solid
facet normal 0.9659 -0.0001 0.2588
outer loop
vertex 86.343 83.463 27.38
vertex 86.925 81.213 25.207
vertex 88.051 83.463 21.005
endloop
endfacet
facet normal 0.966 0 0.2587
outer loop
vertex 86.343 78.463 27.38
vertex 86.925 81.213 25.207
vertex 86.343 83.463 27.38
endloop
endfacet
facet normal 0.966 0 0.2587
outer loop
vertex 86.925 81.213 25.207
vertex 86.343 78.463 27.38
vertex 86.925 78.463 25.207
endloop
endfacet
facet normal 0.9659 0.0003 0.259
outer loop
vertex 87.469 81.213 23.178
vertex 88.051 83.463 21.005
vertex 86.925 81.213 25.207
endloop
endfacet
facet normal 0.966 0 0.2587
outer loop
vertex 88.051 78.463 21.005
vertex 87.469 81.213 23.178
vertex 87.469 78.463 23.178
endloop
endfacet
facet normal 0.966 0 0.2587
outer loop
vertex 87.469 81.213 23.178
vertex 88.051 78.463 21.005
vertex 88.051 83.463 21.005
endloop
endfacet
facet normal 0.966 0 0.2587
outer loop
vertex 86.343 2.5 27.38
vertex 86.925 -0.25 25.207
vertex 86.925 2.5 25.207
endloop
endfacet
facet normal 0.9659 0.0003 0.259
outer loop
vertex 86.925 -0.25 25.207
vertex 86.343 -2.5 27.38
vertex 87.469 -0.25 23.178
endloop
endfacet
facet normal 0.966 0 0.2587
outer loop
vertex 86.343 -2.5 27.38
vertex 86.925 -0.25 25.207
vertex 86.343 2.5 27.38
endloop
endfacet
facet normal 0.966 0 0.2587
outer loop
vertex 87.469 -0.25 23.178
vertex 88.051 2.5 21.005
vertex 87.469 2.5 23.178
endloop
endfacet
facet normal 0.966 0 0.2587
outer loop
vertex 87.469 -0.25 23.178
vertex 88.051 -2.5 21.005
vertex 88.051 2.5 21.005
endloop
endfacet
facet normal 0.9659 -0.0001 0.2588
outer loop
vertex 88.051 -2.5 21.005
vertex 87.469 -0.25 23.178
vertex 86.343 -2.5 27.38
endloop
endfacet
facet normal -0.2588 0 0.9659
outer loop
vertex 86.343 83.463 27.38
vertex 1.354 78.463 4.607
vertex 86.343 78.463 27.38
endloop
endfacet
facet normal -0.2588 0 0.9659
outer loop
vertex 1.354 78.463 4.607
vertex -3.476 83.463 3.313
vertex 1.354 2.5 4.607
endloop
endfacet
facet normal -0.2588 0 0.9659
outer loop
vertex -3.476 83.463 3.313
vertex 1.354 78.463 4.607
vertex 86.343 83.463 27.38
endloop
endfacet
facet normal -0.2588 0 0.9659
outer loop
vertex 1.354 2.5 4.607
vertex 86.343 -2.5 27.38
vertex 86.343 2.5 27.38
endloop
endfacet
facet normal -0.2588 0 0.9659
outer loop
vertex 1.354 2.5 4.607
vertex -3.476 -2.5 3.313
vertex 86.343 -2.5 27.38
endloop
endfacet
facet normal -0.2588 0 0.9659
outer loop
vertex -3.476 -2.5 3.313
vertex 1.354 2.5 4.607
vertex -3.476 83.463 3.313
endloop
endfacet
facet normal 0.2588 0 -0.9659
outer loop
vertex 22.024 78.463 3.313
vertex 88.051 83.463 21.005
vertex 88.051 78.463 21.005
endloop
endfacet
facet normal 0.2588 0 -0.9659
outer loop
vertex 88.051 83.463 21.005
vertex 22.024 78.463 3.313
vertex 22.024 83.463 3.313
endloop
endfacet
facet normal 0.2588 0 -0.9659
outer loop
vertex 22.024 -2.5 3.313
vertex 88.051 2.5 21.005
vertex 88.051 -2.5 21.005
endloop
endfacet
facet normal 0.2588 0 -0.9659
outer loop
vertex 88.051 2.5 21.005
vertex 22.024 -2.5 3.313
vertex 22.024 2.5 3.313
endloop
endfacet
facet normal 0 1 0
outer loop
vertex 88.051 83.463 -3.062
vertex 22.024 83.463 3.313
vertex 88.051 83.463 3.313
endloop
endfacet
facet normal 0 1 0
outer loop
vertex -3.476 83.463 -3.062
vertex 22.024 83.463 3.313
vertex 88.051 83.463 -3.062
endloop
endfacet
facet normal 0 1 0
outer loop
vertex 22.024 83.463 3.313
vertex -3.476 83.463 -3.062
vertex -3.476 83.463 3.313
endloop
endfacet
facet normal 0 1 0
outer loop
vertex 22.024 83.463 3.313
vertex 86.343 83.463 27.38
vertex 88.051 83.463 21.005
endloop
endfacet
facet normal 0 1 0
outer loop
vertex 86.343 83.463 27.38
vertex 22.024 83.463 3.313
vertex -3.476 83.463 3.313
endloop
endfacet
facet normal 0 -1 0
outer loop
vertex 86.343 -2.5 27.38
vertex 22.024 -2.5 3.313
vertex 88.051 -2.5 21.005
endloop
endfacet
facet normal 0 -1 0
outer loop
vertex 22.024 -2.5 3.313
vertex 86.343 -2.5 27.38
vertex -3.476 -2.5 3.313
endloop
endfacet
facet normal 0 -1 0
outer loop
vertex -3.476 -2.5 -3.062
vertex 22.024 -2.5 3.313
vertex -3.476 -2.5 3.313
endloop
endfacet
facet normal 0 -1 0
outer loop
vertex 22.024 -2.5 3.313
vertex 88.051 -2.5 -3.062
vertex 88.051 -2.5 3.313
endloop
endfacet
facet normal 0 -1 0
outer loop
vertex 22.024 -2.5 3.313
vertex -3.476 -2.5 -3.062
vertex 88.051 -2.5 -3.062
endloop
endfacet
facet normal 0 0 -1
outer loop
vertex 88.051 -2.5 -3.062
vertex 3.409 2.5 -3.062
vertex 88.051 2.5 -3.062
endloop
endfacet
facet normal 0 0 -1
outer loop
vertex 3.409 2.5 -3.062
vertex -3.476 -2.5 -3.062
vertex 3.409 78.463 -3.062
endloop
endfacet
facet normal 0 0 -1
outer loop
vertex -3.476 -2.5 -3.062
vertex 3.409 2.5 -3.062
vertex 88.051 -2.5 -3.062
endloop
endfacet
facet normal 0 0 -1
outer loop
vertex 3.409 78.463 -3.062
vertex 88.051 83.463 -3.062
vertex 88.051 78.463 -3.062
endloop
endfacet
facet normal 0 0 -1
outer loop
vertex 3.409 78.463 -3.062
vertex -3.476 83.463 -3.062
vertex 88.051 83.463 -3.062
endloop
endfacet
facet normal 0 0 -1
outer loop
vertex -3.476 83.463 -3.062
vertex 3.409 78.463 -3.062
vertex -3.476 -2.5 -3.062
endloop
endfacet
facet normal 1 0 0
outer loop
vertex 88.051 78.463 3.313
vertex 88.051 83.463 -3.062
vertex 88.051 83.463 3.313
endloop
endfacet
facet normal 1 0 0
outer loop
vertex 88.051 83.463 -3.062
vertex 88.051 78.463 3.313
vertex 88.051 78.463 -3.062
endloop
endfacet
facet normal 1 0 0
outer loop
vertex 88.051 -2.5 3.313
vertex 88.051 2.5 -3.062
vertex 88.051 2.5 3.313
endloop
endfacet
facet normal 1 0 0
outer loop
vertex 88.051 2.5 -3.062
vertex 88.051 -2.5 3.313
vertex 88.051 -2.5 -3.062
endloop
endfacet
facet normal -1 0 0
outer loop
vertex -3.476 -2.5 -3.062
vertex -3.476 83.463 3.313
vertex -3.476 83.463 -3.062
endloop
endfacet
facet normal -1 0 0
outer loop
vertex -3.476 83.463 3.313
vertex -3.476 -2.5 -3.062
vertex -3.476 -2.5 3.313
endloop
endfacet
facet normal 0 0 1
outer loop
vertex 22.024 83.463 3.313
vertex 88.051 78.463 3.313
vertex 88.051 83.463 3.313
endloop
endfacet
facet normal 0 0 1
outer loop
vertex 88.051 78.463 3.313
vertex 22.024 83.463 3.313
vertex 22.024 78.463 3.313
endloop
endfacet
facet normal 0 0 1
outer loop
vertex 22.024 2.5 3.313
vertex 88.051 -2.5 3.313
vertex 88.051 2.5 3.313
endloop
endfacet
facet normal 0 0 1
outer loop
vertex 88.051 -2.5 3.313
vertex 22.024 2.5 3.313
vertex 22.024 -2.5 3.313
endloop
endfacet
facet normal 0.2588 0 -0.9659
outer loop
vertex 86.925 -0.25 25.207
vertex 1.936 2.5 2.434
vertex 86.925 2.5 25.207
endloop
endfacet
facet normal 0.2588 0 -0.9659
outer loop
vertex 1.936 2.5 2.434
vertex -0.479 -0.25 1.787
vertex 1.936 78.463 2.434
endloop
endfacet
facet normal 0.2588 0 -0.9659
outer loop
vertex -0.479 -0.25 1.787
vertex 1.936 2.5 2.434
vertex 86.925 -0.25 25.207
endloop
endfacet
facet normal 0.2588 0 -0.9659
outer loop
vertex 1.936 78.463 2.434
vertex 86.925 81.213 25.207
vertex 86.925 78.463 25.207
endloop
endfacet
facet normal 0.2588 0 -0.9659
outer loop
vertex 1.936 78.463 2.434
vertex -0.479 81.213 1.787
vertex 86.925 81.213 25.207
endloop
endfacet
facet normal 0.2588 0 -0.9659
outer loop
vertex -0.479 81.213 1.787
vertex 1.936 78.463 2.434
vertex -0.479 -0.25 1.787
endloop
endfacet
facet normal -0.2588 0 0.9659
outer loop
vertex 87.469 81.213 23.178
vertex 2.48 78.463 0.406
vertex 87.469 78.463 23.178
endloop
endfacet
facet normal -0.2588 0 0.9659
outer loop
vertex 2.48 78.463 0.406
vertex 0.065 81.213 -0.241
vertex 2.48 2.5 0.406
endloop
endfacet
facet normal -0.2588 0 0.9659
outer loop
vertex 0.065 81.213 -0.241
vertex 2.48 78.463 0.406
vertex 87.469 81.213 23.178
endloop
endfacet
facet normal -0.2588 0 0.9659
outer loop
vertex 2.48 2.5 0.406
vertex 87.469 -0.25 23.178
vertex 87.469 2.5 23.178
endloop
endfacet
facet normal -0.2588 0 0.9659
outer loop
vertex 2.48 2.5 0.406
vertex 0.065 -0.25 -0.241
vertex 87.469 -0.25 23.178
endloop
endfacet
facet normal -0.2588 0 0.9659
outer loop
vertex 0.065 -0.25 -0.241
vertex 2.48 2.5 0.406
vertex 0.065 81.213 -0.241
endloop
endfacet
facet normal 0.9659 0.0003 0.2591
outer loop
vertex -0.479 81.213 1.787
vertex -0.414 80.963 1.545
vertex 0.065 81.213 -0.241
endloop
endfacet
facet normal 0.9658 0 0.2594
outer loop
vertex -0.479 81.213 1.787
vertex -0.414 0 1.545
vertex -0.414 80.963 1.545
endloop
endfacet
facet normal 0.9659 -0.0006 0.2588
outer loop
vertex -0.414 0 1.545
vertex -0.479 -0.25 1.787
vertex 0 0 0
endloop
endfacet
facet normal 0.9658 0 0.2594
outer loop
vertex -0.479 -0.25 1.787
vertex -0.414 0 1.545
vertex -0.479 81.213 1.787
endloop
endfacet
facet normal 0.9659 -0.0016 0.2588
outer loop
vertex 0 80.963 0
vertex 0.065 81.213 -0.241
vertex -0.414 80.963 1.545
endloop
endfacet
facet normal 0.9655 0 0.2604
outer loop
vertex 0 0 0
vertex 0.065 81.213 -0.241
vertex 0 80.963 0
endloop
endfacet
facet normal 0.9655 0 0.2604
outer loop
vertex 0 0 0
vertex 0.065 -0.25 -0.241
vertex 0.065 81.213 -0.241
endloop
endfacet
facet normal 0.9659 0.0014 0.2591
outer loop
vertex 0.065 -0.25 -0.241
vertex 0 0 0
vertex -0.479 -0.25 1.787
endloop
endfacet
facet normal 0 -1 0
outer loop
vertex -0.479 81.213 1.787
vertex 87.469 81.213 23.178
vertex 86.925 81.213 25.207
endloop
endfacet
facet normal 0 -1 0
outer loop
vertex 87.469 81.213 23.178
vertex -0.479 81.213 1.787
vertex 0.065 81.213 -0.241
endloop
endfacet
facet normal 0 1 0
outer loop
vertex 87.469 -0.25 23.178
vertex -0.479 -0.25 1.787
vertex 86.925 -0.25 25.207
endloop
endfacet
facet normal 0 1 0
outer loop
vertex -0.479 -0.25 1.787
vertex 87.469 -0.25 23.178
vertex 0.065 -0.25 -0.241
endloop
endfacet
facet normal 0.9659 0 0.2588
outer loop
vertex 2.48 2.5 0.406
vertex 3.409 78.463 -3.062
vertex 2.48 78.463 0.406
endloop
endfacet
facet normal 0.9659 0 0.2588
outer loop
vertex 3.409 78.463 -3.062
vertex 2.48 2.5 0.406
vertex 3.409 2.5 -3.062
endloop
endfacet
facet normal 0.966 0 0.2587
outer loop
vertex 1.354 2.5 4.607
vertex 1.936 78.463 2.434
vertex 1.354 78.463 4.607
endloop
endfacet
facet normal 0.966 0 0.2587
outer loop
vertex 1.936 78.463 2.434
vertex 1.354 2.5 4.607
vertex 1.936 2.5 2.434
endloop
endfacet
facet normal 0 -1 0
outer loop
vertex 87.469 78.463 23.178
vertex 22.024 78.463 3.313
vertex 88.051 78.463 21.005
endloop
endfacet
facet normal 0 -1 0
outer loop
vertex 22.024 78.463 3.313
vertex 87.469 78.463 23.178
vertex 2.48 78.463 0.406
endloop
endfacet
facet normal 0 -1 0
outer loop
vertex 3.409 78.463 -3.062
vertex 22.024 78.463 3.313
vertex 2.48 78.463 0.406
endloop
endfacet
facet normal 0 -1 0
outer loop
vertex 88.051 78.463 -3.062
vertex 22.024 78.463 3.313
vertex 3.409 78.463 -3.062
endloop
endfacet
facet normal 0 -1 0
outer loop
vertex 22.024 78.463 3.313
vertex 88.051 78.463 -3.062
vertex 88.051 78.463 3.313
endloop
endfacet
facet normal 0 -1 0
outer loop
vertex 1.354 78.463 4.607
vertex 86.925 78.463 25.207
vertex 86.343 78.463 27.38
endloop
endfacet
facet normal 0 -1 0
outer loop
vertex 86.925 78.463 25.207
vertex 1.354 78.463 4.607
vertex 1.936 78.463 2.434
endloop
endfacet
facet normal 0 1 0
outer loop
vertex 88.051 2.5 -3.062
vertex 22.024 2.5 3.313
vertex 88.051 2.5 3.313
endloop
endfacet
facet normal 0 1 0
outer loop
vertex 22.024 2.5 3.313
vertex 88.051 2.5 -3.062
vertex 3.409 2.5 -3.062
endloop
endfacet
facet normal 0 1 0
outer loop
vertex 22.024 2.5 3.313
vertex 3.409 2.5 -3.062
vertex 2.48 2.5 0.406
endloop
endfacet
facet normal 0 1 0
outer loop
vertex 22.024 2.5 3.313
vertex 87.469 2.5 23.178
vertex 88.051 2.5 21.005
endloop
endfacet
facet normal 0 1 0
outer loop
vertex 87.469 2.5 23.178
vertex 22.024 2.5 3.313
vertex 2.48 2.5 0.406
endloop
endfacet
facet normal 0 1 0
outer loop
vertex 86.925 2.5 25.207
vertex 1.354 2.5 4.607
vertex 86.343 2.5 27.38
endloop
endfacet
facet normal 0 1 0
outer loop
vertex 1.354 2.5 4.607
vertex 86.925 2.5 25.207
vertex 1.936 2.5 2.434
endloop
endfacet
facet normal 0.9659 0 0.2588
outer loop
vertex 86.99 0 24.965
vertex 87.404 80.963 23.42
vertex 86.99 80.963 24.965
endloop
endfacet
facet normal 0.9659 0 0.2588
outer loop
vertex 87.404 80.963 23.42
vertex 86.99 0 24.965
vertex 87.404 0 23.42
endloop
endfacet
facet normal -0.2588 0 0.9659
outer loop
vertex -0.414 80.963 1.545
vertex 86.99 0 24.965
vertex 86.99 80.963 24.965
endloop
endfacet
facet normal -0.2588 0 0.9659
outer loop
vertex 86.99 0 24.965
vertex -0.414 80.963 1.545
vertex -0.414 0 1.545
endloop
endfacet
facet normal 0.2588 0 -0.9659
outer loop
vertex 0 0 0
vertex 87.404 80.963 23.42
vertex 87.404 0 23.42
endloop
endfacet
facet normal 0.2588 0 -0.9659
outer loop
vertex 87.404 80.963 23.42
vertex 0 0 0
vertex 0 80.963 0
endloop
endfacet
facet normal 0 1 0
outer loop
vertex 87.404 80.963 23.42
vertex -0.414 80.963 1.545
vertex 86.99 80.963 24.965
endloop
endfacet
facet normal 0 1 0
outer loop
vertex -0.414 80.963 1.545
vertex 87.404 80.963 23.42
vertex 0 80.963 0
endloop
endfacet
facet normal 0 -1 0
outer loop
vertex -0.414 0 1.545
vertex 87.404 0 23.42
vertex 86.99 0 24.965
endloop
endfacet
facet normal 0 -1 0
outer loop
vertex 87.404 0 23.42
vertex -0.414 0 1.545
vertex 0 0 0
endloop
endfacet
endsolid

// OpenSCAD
pcb_size = [90.4875,80.9625,1.6];
tolerance =0.5;
case_thickness=5;
angle = 15;


module pcb(){
    
    cube(pcb_size);
}

module case(){
    difference() {
        union() {
            cube(
                pcb_size +
                [
                    case_thickness/2,
                    case_thickness,
                    case_thickness
                ]
            );

            case_feet();
        }
        
        translate([case_thickness/2,
                case_thickness/2-tolerance/2,
                case_thickness/2-tolerance/2]) 
        cube(pcb_size+[0,tolerance,tolerance]);

        translate([case_thickness,
                case_thickness,
                -500]) 
        cube(pcb_size-[case_thickness/2,case_thickness,0]+ [0,0,10000]);
    }

}

module case_feet() {
  /*
        /
       |\    /     /
       | \  /     /
       \  \/     /___
   |    \ |      
  a|     \|___________
          
          |--b-- ... ---|

  */

    top_piece_d = pcb_size.x  + case_thickness/2;

    top_piece_h = pcb_size.z + case_thickness;
    top_piece_w = pcb_size.y + case_thickness;

    a = cos(angle) * top_piece_h;
    b = cos(angle) * top_piece_d + sin(angle) * top_piece_h;
    
    difference() {
        translate([0,0,top_piece_h]) 
        rotate([0,90+angle,0]) 
        cube([a,top_piece_w,b]);
    }

}






rotate([0,-angle,0]){
    color(c = "green") 
   pcb();

translate([-case_thickness/2,-case_thickness/2,-case_thickness/2]) 
case();

}
